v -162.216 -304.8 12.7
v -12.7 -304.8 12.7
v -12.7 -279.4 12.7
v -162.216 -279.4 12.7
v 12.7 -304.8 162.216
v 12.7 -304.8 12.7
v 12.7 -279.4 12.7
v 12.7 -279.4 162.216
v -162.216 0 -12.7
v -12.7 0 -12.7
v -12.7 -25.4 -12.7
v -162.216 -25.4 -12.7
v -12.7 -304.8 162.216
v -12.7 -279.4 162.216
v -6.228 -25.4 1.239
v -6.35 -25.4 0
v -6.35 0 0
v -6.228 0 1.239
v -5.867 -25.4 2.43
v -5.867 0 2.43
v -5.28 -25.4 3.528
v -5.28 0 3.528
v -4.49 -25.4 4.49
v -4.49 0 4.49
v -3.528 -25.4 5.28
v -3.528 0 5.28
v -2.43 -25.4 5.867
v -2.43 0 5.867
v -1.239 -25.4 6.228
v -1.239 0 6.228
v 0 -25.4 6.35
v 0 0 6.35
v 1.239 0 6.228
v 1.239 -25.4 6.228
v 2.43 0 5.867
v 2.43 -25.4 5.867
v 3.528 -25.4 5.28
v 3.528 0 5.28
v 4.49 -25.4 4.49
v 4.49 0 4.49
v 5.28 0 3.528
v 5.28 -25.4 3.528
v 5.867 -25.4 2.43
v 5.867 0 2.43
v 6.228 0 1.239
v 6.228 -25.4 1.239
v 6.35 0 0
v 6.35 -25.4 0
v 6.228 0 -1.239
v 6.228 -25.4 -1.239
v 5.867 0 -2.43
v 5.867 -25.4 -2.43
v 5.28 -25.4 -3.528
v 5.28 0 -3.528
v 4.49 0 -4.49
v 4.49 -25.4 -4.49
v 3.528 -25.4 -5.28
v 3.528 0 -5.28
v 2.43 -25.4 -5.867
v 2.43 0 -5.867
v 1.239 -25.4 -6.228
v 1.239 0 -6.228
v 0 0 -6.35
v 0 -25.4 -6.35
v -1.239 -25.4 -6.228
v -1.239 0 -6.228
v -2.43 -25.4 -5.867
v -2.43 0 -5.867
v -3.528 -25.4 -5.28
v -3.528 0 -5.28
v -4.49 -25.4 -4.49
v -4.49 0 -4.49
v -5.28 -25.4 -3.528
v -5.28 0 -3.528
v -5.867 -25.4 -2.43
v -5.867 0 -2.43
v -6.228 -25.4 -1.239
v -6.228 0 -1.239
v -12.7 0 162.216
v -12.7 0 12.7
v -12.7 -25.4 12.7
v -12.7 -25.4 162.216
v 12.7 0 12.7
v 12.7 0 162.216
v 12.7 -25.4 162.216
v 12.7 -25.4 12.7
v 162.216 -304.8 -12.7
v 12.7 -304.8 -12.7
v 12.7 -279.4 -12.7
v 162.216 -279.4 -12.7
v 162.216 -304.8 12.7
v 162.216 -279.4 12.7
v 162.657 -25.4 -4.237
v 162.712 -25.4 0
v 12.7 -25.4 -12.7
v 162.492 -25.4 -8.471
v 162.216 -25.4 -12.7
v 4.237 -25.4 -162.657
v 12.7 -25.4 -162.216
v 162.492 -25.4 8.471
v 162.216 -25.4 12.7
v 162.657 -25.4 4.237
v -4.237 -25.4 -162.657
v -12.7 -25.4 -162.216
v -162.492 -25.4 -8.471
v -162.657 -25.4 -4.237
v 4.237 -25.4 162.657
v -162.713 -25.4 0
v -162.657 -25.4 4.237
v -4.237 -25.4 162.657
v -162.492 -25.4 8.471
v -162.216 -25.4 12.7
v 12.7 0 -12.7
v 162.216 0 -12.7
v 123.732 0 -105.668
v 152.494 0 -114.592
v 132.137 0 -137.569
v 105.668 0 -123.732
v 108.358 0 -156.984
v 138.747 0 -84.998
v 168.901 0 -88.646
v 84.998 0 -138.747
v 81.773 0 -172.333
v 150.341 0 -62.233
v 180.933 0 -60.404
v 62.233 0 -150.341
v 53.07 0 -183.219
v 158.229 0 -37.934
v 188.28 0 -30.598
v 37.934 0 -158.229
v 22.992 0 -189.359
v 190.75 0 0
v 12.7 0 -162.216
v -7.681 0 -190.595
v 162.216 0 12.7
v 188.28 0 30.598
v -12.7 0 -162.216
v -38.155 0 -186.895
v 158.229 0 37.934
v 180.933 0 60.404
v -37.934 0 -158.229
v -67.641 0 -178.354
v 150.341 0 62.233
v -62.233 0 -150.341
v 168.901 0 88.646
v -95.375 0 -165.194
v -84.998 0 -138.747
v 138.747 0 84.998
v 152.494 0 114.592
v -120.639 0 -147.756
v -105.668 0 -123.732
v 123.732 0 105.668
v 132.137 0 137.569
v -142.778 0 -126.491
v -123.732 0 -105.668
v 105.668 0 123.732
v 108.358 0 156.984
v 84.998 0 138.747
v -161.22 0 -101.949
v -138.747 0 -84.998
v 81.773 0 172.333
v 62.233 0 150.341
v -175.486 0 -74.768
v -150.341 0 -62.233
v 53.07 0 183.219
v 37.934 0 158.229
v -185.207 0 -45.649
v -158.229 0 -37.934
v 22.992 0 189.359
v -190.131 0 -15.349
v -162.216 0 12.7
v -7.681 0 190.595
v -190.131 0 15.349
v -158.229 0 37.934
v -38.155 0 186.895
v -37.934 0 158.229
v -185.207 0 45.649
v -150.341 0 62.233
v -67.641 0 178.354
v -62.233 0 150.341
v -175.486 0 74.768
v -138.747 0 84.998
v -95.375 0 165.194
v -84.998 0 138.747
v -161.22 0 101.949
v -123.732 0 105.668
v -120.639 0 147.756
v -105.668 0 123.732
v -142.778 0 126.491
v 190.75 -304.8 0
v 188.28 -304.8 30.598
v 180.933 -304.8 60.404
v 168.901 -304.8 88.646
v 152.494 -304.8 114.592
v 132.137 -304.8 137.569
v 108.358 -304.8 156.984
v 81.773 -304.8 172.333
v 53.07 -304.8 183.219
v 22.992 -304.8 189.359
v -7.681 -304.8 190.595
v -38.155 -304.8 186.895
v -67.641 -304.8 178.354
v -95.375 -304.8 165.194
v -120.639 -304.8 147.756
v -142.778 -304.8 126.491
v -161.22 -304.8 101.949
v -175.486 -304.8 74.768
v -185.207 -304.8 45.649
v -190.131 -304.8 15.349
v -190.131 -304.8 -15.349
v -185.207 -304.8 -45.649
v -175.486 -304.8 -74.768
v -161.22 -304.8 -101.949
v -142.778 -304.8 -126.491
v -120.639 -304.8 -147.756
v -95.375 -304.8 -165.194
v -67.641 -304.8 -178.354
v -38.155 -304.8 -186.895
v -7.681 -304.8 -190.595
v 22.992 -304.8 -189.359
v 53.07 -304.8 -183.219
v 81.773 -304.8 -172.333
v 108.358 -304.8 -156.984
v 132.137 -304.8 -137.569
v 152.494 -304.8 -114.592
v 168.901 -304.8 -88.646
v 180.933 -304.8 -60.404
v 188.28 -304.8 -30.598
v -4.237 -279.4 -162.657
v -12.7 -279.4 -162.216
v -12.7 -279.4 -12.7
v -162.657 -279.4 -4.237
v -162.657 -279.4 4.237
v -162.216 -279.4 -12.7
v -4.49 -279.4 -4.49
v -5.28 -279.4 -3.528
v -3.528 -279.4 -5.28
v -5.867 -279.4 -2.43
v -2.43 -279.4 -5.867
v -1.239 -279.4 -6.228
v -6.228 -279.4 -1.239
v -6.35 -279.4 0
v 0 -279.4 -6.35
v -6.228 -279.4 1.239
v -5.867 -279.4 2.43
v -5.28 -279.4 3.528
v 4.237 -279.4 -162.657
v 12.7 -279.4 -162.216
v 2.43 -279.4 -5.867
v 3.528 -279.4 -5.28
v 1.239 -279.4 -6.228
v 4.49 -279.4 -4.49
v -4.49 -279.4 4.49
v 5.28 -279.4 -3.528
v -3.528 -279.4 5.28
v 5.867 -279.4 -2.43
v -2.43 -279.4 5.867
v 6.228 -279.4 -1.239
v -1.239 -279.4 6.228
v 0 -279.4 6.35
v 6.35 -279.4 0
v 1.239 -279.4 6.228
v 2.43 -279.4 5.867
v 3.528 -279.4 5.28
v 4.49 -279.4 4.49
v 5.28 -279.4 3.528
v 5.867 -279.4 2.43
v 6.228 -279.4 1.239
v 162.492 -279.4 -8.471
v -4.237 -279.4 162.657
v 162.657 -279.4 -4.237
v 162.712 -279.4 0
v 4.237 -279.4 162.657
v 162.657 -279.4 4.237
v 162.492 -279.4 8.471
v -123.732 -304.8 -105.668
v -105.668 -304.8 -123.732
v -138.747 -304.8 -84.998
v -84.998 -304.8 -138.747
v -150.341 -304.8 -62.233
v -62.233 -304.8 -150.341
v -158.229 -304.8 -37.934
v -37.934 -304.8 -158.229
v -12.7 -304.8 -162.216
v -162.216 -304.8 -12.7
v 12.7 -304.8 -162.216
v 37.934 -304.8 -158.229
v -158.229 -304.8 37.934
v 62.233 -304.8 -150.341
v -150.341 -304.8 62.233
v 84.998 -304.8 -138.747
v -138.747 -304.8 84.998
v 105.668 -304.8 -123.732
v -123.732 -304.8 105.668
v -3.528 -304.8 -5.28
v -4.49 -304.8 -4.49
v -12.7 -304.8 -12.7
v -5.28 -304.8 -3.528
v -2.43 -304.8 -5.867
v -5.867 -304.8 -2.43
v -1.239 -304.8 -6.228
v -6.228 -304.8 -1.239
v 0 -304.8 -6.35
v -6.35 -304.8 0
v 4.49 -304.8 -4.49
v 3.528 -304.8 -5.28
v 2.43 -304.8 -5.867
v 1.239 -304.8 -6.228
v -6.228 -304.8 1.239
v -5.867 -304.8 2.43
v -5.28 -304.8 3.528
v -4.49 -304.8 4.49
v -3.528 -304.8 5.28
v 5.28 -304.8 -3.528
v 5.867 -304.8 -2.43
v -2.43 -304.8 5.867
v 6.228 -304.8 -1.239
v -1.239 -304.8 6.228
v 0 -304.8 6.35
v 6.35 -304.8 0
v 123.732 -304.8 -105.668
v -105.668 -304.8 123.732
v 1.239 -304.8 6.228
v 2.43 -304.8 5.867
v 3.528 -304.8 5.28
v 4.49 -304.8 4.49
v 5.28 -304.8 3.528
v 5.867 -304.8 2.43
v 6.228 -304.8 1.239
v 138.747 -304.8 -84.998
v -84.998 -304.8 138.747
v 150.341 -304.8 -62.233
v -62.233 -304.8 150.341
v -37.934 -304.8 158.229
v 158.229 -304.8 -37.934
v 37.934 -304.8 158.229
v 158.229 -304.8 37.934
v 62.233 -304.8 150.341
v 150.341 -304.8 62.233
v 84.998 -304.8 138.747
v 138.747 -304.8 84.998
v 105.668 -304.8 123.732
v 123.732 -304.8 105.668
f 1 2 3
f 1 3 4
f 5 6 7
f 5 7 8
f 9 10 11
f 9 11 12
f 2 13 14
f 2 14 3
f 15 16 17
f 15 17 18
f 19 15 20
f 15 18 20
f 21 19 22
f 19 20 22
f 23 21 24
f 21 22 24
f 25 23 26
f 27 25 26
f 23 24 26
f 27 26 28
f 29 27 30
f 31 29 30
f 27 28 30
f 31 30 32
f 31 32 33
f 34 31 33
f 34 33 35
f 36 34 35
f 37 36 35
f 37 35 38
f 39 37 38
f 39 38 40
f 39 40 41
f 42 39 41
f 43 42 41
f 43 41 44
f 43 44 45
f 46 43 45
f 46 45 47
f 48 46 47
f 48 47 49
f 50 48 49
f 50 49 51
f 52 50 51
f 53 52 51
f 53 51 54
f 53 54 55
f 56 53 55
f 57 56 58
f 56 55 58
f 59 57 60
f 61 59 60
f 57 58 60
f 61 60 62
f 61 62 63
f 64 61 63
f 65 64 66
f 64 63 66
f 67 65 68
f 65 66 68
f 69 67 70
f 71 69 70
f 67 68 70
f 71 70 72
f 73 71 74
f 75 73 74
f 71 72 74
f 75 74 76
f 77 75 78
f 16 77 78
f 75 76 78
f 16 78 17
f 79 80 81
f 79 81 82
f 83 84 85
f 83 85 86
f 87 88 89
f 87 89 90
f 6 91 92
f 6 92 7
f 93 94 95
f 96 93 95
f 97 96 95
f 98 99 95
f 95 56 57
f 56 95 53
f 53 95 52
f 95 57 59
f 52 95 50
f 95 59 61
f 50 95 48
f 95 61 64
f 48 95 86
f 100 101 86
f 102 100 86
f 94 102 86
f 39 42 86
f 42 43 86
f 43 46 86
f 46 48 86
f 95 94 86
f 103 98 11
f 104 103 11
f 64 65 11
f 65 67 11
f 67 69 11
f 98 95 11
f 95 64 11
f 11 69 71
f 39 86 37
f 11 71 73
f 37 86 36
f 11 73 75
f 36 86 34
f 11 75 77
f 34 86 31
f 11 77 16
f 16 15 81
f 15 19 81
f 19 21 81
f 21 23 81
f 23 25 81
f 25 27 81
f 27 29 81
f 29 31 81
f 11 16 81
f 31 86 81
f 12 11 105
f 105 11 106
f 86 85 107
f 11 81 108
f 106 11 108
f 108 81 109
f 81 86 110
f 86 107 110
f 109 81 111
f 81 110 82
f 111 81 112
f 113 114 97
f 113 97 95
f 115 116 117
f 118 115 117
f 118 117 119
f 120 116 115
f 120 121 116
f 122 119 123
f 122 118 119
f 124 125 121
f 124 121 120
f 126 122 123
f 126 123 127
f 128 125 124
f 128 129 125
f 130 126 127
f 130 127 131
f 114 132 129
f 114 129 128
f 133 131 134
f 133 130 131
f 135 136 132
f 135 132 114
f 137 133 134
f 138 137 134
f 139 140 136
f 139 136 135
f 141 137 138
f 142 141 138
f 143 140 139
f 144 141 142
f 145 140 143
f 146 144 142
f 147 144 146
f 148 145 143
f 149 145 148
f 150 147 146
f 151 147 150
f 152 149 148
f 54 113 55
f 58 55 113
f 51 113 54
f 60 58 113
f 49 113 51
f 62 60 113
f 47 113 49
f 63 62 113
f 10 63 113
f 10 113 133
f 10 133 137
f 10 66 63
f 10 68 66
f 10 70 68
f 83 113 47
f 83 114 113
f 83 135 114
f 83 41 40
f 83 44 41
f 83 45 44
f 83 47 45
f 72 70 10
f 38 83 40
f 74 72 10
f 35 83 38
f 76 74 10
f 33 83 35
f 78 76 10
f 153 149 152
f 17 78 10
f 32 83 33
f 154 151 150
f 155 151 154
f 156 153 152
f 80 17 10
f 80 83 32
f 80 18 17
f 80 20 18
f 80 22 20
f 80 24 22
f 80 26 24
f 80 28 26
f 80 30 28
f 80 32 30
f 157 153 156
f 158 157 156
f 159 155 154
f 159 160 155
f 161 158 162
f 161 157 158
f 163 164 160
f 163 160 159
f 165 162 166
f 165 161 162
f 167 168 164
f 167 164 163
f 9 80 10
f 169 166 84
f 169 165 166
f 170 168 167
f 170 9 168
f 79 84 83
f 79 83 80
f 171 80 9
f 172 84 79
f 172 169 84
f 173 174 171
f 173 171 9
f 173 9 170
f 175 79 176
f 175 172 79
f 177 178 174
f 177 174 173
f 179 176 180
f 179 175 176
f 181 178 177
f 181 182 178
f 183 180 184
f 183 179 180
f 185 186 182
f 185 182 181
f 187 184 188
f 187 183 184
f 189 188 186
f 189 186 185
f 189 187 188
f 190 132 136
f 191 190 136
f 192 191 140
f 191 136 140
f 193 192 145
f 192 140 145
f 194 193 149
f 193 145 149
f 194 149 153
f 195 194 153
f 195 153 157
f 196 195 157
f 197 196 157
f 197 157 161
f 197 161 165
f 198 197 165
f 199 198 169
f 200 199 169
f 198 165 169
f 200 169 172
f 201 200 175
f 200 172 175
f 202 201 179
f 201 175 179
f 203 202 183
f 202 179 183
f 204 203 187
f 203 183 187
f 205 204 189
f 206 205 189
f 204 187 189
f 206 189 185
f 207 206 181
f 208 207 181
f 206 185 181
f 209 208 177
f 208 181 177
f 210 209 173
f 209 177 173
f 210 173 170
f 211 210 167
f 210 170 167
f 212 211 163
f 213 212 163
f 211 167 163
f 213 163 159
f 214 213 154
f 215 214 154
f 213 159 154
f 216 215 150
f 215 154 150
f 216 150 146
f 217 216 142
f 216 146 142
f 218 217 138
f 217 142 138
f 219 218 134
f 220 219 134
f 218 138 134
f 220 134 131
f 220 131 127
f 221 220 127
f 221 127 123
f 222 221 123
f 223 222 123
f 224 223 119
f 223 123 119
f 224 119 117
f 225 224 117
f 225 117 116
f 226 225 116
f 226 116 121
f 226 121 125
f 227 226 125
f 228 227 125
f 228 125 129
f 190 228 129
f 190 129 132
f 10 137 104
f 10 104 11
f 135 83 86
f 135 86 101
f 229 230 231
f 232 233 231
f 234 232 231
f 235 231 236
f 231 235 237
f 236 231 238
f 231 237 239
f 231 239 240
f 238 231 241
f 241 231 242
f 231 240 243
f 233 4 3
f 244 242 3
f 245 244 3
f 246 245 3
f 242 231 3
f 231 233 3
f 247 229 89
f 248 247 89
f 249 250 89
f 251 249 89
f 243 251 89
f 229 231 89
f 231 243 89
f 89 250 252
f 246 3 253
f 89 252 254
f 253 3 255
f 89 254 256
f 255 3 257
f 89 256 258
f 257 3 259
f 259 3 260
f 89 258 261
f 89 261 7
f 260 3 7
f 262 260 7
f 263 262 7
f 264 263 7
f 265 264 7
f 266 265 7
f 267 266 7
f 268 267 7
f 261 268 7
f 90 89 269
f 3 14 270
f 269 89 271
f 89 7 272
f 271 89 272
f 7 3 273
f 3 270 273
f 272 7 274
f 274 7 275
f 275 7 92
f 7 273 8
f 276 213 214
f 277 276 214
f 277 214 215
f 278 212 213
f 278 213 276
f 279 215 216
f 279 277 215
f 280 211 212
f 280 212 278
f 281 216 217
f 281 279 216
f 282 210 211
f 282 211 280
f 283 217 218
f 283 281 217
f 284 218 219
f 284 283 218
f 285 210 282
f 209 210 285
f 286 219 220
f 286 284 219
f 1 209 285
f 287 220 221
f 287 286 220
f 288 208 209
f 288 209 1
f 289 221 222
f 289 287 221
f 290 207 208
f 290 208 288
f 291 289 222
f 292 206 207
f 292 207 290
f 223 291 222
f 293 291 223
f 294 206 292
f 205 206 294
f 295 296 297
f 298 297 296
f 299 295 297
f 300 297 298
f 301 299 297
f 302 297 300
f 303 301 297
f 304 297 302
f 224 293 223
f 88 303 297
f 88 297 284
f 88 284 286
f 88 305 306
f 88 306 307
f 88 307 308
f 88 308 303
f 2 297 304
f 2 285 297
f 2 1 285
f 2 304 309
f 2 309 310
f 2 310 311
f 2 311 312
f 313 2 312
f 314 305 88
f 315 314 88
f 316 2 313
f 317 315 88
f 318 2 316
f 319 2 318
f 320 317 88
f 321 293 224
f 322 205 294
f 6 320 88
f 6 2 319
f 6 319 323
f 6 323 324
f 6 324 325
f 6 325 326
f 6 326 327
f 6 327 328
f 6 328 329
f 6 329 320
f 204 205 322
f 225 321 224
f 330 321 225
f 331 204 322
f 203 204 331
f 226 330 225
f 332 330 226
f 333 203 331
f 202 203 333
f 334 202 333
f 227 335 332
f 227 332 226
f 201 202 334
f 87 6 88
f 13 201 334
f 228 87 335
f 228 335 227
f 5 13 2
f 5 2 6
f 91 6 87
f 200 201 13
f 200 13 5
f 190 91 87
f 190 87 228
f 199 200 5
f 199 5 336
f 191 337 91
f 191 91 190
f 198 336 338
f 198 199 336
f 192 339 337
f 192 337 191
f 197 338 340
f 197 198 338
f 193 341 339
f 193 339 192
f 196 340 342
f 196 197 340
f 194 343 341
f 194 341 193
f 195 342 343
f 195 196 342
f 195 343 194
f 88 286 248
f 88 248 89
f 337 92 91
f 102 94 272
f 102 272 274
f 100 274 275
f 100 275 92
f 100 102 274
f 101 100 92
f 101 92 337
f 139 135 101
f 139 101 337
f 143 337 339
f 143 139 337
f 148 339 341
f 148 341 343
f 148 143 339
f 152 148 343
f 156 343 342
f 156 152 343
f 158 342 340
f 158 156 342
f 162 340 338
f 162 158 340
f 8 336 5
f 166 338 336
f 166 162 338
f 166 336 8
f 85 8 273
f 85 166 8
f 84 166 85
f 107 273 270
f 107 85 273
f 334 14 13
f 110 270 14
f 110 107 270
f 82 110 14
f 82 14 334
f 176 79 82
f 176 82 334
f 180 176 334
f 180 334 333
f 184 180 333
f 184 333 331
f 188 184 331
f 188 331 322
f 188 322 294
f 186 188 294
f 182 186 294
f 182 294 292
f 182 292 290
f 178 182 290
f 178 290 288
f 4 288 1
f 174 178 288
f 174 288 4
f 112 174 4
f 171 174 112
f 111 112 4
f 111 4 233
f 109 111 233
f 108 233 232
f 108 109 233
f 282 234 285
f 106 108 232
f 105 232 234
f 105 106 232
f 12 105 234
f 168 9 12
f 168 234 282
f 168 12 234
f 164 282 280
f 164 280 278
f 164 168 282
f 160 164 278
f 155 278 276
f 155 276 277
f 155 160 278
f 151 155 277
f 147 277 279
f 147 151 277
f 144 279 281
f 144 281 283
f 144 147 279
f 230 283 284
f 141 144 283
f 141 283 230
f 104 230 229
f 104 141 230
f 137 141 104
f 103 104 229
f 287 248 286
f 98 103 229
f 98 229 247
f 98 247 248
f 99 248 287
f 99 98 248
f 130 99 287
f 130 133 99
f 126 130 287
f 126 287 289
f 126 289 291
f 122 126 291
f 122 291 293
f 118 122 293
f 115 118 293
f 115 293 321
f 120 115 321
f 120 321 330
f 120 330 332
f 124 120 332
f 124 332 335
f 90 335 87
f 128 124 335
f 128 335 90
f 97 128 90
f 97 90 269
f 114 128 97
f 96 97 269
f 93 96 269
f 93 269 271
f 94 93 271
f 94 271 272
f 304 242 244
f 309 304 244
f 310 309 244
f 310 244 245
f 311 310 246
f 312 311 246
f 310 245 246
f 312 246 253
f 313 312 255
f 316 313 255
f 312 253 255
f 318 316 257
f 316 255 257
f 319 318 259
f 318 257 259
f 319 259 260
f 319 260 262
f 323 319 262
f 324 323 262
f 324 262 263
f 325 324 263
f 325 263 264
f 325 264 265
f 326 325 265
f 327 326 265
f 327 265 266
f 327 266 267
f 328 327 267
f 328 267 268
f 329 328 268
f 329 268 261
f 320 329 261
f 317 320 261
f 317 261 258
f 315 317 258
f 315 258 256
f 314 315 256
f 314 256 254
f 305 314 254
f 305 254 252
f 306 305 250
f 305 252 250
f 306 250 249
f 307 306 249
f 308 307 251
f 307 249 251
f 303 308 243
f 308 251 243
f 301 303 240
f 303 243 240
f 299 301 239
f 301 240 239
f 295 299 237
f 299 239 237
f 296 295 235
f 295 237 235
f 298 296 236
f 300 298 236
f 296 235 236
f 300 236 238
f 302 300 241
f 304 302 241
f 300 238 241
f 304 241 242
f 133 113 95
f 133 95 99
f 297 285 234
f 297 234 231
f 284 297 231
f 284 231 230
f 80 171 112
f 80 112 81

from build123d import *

# Parameters (mm, degrees)
F0_R     = 190.75
F0_R_2   = 162.7125
F1_DEPTH = 304.8
F3_DEPTH = 25.4
F5_DEPTH = 25.4
F6_R     = 6.35
F7_DEPTH = 382


with BuildPart() as f1:
    # F0 (on Front) → F1 (new body)
    with BuildSketch(Plane.XZ):
        Circle(F0_R)
        Circle(F0_R_2, mode=Mode.SUBTRACT)
    extrude(amount=F1_DEPTH)

    # F2 (on face) → F3 (join)
    with BuildSketch(Plane.XZ.offset(304.8)):
        with BuildLine():
            ThreePointArc((12.7, 162.216114), (0, 162.7125), (-12.7, 162.216114))
            Line((-12.7, 162.216114), (-12.7, 12.7))
            Line((-12.7, 12.7), (-12.7, -12.7))
            Line((-12.7, -12.7), (-12.7, -162.216114))
            ThreePointArc((-12.7, -162.216114), (0, -162.7125), (12.7, -162.216114))
            Line((12.7, -162.216114), (12.7, -12.7))
            Line((12.7, -12.7), (12.7, 12.7))
            Line((12.7, 12.7), (12.7, 162.216114))
        make_face()
        with BuildLine():
            Line((-12.7, -12.7), (-12.7, 12.7))
            Line((-12.7, 12.7), (-162.216114, 12.7))
            ThreePointArc((-162.216114, 12.7), (-162.7125, 0), (-162.216114, -12.7))
            Line((-162.216114, -12.7), (-12.7, -12.7))
        make_face()
        with BuildLine():
            Line((162.216114, 12.7), (12.7, 12.7))
            Line((12.7, 12.7), (12.7, -12.7))
            Line((12.7, -12.7), (162.216114, -12.7))
            ThreePointArc((162.216114, -12.7), (162.7125, 0), (162.216114, 12.7))
        make_face()
        with BuildLine():
            Line((162.216114, 12.7), (12.7, 12.7))
            Line((12.7, 12.7), (12.7, -12.7))
            Line((12.7, -12.7), (162.216114, -12.7))
            ThreePointArc((162.216114, -12.7), (162.588356, -6.354849), (162.7125, 0))
            ThreePointArc((162.7125, 0), (162.588356, 6.354849), (162.216114, 12.7))
        make_face()
    extrude(amount=-F3_DEPTH)

    # F4 (on face) → F5 (join)
    with BuildSketch(Plane(origin=(0, 0, 0), x_dir=(-1, 0, 0), z_dir=(0, 1, 0))):
        with BuildLine():
            Line((-12.7, 162.216114), (-12.7, 12.7))
            Line((-12.7, 12.7), (-162.216114, 12.7))
            ThreePointArc((-162.216114, 12.7), (-162.7125, 0), (-162.216114, -12.7))
            Line((-162.216114, -12.7), (-12.7, -12.7))
            Line((-12.7, -12.7), (-12.7, -162.216114))
            ThreePointArc((-12.7, -162.216114), (0, -162.7125), (12.7, -162.216114))
            Line((12.7, -162.216114), (12.7, -12.7))
            Line((12.7, -12.7), (162.216114, -12.7))
            ThreePointArc((162.216114, -12.7), (162.588356, -6.354849), (162.7125, 0))
            ThreePointArc((162.7125, 0), (162.588356, 6.354849), (162.216114, 12.7))
            Line((162.216114, 12.7), (12.7, 12.7))
            Line((12.7, 12.7), (12.7, 162.216114))
            ThreePointArc((12.7, 162.216114), (0, 162.7125), (-12.7, 162.216114))
        make_face()
    extrude(amount=-F5_DEPTH)

    # F6 (on face) → F7 (cut)
    with BuildSketch(Plane(origin=(0, 0, 0), x_dir=(-1, 0, 0), z_dir=(0, 1, 0))):
        Circle(F6_R)
    extrude(amount=-F7_DEPTH, mode=Mode.SUBTRACT)


solid = f1.part
